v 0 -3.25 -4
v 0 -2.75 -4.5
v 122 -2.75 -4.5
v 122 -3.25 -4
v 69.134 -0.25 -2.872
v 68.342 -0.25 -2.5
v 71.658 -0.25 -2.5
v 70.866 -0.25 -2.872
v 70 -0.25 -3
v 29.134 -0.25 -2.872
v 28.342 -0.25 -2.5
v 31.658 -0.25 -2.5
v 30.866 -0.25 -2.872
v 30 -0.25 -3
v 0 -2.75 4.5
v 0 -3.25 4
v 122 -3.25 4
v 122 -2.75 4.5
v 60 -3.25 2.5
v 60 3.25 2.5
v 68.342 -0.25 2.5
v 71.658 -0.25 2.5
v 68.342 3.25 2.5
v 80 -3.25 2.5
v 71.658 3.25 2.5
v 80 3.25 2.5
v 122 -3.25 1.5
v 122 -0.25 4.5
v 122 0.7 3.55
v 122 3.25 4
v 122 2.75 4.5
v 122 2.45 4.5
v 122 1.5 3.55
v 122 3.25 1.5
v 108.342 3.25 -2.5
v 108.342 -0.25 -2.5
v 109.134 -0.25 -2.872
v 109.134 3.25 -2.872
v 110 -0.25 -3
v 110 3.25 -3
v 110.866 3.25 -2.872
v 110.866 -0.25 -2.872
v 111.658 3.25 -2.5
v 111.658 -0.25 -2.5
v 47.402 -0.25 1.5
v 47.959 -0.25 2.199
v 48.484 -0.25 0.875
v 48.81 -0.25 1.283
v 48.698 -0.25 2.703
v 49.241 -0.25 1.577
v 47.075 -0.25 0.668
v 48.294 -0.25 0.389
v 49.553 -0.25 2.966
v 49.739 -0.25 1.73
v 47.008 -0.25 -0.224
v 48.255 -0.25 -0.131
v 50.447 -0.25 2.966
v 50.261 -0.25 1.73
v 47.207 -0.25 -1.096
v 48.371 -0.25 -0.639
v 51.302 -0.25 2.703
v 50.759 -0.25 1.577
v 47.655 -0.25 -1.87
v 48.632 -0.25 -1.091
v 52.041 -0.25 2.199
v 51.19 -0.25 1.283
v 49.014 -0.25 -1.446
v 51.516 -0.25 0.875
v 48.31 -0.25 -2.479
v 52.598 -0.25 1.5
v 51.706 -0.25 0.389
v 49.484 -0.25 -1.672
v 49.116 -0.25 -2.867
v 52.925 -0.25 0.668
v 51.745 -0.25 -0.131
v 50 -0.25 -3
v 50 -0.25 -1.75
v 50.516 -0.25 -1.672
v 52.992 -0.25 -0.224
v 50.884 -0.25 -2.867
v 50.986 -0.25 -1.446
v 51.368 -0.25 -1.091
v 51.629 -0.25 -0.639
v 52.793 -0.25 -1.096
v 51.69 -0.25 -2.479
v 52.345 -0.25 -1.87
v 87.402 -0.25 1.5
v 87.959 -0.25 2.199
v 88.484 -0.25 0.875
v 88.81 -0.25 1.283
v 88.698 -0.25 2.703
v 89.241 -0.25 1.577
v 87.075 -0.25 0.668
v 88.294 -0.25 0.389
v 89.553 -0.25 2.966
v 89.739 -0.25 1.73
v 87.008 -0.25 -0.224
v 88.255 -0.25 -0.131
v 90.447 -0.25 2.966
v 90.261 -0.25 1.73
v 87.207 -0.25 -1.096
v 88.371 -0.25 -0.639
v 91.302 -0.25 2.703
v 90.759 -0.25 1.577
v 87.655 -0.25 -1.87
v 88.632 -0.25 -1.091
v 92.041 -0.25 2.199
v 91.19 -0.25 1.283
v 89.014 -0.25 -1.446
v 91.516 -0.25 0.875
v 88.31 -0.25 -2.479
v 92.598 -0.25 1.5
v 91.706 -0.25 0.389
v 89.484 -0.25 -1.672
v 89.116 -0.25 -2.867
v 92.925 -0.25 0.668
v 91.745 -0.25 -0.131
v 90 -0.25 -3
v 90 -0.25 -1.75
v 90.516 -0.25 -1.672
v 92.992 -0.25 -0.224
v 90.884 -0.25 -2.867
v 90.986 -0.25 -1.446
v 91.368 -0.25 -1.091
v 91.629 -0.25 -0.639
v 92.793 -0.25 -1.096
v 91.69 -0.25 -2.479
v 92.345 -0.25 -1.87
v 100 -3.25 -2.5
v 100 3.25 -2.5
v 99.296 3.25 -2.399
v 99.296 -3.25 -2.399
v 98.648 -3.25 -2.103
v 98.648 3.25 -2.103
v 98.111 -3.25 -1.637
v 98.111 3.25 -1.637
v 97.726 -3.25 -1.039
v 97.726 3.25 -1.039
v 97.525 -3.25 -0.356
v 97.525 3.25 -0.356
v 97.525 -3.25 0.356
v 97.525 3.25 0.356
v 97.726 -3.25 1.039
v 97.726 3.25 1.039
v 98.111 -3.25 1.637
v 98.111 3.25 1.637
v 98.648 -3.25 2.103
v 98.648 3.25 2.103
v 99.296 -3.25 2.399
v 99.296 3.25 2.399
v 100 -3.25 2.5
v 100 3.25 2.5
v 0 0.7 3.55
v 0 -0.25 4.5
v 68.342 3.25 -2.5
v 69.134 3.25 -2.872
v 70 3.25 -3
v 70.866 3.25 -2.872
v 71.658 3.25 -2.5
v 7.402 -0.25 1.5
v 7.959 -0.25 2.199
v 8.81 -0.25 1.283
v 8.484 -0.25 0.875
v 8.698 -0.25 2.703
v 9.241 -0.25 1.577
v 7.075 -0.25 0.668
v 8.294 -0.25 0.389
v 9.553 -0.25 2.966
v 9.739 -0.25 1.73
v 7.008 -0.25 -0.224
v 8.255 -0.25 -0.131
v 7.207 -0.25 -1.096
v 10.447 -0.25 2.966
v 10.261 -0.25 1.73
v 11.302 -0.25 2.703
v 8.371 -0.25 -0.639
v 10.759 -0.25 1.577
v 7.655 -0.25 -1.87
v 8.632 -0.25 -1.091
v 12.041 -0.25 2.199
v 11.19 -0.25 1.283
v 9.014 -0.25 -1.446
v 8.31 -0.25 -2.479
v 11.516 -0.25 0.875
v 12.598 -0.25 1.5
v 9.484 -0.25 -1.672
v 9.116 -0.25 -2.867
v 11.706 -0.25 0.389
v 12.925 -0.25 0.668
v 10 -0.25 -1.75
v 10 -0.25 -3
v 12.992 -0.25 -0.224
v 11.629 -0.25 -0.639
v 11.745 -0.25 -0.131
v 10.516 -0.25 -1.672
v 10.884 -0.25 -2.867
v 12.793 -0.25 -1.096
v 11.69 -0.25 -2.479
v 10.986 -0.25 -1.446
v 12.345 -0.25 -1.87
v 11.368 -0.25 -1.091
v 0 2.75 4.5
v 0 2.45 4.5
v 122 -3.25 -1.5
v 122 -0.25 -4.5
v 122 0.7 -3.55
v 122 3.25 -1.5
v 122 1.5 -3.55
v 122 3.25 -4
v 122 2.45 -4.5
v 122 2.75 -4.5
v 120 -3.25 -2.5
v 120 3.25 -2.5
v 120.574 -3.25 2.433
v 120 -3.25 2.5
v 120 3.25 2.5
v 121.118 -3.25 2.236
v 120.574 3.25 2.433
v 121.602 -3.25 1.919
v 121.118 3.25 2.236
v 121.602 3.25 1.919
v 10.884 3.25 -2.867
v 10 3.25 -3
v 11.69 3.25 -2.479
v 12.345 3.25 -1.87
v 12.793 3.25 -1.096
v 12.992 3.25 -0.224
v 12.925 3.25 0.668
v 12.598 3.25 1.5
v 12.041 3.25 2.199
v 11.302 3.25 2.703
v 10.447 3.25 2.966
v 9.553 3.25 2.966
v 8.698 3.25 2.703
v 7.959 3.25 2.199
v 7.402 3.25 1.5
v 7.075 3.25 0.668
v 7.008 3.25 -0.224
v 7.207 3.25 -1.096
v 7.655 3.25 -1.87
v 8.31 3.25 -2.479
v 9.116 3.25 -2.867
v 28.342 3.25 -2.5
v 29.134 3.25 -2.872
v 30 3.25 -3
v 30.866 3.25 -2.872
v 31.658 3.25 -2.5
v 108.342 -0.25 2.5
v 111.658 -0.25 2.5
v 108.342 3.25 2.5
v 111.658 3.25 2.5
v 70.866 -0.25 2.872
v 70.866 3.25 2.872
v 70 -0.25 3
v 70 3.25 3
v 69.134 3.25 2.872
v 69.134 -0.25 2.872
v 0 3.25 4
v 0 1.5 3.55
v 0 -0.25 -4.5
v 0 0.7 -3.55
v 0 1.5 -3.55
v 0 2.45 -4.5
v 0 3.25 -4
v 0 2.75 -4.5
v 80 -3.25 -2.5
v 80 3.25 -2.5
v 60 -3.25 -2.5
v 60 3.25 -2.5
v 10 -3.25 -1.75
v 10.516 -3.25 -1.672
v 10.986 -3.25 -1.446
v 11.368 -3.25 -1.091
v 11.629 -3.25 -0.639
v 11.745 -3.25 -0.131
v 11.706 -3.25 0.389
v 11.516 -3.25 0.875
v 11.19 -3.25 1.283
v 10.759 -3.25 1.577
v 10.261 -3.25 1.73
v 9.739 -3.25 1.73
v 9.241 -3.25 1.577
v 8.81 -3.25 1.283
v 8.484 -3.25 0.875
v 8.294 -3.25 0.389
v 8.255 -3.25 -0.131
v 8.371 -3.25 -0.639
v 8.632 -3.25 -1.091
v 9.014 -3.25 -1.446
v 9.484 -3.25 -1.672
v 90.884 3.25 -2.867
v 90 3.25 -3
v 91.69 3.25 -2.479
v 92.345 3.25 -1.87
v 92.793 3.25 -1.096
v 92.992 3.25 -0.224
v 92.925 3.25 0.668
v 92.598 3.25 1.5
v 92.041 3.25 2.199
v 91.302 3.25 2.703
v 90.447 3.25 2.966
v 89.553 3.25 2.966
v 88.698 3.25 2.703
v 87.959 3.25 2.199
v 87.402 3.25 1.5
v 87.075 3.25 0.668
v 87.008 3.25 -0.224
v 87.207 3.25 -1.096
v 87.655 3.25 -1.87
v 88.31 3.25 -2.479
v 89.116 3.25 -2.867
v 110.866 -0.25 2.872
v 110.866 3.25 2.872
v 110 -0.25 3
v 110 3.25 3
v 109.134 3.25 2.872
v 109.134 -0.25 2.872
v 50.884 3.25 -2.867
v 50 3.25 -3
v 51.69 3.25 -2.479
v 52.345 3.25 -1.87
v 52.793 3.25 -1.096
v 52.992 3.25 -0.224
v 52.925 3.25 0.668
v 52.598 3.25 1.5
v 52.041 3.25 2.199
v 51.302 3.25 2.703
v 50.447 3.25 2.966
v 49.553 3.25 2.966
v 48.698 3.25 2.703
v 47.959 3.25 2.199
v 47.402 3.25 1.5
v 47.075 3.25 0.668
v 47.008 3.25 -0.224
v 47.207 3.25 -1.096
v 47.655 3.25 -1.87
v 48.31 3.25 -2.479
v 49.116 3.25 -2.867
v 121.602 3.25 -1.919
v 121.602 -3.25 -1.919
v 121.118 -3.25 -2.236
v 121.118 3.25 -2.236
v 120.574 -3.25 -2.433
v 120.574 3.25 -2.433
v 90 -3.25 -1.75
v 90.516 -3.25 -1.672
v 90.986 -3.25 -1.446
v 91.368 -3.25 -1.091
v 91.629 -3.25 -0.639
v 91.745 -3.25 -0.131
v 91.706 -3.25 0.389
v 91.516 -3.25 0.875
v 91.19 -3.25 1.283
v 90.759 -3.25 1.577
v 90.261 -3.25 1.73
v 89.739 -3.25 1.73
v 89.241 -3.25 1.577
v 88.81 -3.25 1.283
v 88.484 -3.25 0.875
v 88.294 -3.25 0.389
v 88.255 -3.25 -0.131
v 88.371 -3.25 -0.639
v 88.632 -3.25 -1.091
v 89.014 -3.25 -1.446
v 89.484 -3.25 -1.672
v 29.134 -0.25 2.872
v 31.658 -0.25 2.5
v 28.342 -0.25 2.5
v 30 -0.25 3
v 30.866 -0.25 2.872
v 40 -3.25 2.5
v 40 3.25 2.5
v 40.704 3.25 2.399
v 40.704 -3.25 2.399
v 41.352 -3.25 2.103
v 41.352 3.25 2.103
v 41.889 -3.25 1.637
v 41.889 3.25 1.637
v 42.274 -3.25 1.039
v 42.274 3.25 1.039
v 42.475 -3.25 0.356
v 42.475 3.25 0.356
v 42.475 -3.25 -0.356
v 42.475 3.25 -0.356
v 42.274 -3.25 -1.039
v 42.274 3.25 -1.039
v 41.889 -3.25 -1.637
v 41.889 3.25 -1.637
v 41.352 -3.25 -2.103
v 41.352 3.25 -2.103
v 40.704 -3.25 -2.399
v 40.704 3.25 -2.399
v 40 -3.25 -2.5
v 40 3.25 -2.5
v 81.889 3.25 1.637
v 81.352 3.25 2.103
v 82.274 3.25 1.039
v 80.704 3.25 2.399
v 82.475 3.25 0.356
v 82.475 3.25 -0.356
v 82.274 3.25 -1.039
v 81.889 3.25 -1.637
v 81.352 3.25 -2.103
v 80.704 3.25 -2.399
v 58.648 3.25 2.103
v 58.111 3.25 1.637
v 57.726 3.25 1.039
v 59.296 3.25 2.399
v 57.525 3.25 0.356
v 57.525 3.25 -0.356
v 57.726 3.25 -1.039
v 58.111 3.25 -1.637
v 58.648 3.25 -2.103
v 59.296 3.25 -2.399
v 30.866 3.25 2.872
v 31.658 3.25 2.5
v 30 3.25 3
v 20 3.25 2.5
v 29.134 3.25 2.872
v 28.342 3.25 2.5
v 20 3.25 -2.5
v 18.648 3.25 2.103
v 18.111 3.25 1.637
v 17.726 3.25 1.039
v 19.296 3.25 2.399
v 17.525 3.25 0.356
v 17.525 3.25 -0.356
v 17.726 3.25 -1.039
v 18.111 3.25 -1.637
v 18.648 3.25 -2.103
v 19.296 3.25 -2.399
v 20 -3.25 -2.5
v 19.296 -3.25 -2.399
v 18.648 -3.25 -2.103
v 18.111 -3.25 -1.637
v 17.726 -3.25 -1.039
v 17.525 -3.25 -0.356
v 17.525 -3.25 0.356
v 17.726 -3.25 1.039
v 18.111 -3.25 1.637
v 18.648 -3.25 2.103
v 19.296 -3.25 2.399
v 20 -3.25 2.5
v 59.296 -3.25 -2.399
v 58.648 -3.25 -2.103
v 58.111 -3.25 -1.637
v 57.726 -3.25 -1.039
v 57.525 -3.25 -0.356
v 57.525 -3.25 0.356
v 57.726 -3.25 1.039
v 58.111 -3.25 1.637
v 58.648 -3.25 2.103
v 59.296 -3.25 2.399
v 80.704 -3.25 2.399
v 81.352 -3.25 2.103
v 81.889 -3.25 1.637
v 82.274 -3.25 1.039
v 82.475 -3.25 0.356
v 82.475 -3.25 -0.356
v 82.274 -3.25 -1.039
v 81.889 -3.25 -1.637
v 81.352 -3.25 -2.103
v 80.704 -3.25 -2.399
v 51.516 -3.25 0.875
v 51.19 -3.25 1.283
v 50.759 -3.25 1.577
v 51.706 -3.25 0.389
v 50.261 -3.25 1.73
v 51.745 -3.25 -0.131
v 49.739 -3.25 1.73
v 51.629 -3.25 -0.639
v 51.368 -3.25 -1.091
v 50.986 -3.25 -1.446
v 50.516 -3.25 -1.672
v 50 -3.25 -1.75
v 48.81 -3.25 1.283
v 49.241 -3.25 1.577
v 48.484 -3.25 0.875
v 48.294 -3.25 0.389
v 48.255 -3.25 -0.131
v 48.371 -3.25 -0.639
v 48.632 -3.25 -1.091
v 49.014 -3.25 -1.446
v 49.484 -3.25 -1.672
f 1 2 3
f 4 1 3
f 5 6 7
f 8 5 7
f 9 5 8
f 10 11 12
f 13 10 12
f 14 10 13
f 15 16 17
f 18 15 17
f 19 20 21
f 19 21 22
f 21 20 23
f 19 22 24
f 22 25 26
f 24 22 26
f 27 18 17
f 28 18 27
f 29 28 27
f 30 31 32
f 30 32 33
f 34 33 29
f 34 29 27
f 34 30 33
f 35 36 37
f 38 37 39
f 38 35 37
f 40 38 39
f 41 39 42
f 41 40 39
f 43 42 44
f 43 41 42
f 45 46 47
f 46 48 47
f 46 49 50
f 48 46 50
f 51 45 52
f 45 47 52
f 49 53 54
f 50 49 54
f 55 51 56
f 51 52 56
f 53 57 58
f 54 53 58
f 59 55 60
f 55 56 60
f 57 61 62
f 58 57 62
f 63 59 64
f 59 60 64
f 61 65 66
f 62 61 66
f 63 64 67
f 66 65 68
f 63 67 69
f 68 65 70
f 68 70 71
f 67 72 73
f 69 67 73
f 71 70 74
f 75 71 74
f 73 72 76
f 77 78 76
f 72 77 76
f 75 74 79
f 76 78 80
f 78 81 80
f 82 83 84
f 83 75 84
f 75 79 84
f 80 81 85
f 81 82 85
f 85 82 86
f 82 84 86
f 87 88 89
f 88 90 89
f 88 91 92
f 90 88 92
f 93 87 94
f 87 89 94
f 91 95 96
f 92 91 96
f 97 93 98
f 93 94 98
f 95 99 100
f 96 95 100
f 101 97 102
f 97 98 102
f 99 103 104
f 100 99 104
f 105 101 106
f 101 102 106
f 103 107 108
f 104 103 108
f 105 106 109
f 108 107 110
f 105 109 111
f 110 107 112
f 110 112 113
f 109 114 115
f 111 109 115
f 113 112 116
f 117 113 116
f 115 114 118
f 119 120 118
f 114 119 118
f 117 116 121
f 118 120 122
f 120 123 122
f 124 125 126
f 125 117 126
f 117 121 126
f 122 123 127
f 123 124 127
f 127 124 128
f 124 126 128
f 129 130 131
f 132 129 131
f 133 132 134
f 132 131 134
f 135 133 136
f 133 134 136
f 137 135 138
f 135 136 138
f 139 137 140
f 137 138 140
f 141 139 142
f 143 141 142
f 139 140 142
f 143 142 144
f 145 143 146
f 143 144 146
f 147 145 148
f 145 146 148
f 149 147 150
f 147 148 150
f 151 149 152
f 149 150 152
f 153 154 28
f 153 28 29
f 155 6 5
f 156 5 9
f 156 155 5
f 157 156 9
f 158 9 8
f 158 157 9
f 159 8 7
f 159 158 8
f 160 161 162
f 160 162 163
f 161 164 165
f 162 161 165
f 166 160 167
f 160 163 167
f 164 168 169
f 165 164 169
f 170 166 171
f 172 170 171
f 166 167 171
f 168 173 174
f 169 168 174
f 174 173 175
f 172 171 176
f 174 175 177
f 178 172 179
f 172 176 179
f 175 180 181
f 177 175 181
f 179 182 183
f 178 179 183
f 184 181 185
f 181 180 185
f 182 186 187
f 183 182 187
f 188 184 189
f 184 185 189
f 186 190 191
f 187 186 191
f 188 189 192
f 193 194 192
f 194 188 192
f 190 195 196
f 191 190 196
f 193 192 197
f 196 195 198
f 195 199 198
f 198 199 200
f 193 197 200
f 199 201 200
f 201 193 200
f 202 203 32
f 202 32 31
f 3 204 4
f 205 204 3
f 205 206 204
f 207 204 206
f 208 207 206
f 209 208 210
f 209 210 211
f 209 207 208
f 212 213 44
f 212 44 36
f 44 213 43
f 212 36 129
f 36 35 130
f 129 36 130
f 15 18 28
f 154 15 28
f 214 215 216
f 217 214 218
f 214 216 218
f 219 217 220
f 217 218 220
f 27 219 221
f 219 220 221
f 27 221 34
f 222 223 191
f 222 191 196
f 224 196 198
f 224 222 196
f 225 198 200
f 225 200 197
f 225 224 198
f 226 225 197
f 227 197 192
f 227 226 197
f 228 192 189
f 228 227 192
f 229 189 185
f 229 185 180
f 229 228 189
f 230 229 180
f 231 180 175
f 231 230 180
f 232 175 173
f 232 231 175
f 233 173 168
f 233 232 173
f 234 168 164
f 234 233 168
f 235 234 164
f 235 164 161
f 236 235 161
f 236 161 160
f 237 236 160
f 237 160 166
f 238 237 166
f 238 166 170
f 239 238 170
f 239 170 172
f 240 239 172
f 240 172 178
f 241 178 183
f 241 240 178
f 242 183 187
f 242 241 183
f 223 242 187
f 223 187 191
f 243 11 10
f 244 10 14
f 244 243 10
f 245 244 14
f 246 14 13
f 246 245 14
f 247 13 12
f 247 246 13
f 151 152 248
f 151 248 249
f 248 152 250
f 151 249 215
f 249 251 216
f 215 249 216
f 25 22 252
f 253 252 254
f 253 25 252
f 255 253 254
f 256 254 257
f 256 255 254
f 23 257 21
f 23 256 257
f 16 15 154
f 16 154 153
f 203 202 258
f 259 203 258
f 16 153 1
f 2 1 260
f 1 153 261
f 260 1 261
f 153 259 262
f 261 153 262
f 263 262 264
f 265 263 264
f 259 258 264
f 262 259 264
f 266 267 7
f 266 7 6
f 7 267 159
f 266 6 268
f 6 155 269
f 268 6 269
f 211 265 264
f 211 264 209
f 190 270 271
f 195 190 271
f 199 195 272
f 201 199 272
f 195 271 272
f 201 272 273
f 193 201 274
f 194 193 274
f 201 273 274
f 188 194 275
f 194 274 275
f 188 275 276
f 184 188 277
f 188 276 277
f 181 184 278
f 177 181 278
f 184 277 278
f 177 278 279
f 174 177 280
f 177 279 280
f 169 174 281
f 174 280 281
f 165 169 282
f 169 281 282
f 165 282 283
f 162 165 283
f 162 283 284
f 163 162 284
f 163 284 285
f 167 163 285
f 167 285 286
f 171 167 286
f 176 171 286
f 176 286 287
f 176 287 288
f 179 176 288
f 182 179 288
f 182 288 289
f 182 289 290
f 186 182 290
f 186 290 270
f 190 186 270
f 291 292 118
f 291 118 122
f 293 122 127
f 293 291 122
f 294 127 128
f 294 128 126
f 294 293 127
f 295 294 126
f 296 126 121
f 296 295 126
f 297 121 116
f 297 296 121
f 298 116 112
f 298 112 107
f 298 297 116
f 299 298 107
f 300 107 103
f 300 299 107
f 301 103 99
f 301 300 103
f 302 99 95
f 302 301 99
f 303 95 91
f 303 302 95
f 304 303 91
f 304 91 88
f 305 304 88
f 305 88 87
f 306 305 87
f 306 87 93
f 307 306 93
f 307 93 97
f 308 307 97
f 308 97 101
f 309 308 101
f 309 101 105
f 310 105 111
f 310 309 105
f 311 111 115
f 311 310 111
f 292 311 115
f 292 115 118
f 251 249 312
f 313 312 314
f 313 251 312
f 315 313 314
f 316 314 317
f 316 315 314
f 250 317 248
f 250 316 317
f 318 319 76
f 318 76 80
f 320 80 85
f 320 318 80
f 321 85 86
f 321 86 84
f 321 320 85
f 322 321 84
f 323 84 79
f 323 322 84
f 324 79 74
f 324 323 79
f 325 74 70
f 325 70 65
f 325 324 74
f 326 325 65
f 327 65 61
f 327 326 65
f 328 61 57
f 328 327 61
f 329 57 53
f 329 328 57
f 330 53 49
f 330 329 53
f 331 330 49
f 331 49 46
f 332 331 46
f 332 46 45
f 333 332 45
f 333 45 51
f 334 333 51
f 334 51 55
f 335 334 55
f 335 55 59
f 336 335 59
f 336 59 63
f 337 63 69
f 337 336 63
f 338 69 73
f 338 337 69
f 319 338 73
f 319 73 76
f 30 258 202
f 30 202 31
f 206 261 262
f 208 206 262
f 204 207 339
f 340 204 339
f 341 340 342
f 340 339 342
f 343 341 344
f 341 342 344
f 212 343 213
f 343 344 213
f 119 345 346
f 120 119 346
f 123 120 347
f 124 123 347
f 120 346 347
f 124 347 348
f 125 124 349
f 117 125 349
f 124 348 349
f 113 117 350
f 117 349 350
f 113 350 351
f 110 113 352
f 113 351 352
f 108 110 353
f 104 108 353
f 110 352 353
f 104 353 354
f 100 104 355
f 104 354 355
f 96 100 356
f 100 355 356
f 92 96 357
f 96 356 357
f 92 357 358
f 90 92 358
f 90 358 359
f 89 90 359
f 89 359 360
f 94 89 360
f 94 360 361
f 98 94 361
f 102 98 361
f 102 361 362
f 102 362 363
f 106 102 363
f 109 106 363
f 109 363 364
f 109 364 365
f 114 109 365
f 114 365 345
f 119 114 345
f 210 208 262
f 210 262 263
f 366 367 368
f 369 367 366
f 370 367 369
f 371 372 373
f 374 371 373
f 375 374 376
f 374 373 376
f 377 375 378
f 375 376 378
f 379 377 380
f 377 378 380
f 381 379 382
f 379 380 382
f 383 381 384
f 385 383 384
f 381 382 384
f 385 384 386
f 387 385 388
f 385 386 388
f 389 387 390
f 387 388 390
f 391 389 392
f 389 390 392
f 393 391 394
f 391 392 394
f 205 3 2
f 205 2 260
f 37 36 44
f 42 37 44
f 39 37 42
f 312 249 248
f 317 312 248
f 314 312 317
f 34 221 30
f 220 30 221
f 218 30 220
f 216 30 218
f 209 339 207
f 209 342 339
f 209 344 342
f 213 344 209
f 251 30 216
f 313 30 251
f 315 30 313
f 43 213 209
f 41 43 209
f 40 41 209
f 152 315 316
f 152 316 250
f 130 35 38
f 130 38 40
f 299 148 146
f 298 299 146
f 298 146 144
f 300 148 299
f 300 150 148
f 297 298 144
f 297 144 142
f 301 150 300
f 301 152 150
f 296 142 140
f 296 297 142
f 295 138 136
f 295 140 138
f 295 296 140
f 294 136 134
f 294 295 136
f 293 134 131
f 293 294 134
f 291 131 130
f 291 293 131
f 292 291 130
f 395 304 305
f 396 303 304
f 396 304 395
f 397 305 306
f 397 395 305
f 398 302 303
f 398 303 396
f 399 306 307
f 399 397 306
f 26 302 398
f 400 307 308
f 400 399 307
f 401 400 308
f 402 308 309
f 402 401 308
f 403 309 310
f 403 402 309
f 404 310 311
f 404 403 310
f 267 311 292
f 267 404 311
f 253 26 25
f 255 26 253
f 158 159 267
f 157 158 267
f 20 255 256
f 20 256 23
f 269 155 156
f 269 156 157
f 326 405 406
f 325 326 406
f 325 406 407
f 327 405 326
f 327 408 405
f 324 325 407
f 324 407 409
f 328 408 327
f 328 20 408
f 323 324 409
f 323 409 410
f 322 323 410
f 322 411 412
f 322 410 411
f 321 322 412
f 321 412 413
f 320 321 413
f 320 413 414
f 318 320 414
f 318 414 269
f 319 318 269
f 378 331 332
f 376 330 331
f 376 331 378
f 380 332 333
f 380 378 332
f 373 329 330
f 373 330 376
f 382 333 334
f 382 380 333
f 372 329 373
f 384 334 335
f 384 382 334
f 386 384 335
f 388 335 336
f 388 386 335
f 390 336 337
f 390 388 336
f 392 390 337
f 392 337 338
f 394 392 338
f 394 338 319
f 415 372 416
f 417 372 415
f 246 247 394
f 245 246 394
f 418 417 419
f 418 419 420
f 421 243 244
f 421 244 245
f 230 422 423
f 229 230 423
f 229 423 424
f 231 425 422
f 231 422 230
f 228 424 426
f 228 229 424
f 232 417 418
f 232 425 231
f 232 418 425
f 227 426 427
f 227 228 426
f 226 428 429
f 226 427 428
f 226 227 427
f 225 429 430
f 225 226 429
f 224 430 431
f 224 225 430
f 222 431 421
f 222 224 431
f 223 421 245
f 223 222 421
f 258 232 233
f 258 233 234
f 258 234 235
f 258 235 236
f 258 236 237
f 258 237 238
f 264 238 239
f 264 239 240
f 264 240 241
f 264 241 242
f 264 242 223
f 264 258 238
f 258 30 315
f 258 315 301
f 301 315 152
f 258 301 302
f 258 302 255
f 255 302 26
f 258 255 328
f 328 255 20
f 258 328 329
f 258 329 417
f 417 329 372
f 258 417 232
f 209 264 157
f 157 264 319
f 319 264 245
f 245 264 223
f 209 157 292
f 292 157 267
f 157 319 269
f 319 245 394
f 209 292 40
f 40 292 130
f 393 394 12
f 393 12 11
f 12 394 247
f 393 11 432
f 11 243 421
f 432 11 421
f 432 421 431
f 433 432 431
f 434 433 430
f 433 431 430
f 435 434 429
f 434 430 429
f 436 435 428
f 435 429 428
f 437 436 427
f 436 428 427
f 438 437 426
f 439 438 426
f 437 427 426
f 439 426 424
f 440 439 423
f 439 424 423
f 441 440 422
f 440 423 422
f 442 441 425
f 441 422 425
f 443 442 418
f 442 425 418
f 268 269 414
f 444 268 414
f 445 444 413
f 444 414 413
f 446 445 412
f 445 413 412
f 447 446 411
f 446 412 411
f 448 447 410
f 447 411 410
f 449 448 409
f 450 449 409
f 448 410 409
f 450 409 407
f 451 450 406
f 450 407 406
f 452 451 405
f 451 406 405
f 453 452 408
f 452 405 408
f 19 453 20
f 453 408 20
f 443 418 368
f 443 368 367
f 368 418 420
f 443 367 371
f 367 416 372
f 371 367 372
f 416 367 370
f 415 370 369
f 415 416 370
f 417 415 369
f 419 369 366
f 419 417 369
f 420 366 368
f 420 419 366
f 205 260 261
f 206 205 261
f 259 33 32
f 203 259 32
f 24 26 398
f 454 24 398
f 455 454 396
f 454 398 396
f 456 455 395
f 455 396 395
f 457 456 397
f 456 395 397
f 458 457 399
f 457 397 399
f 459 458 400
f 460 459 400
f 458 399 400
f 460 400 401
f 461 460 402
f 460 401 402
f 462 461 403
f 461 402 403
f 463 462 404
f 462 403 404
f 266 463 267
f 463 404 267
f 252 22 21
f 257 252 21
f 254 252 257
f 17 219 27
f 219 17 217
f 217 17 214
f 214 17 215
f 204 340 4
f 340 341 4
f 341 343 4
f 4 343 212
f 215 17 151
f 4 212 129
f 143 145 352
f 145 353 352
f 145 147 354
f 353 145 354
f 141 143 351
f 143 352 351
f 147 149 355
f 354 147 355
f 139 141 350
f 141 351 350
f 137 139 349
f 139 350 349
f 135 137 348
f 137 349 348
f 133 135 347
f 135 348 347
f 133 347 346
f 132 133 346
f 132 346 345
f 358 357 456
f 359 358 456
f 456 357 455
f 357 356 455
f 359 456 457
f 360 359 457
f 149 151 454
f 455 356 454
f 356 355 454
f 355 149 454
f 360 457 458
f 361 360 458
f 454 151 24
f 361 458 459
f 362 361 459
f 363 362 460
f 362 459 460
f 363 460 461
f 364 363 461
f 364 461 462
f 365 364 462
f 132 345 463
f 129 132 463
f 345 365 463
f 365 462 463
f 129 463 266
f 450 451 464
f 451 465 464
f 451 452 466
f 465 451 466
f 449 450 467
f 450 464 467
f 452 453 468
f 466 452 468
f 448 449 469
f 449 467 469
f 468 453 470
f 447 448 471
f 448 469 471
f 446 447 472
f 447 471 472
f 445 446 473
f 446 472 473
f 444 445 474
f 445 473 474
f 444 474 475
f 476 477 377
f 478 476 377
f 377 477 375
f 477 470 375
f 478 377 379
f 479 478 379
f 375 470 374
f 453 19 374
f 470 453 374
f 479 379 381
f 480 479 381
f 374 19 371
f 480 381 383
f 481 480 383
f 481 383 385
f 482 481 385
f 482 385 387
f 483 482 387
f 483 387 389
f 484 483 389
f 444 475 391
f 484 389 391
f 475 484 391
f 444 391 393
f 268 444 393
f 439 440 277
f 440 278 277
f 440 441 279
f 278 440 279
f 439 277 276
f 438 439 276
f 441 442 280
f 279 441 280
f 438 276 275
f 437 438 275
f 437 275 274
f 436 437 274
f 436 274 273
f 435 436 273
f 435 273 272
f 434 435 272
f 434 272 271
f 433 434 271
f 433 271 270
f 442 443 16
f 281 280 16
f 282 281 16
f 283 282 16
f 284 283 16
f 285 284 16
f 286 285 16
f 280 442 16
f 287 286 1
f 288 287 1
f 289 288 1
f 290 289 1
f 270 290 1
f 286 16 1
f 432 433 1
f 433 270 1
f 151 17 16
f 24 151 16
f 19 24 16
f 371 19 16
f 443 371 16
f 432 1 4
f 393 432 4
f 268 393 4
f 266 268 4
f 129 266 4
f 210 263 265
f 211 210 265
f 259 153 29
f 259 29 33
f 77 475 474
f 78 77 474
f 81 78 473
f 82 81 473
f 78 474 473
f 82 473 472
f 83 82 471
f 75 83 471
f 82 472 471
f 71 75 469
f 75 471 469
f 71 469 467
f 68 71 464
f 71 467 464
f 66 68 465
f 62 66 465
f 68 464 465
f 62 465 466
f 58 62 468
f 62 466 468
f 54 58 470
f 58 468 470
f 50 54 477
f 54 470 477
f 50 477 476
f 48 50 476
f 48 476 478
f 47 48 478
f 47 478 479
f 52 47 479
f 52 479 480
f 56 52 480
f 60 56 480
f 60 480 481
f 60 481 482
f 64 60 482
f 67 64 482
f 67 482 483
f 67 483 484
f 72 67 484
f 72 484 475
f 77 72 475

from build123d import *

# Parameters (mm, degrees)
SKETCH_1_W            = 9
SKETCH_1_H            = 6.5
EXTRUDE_1_DEPTH       = 122
SKETCH_2_R            = 1.75
CUT_EXTRUDE_2_DEPTH   = 8
SKETCH_3_R            = 3
CUT_EXTRUDE_3_DEPTH   = 3.5
CHAMFER_1_SIZE        = 0.5
CUT_EXTRUDE_2_2_DEPTH = 123.126215449
CUT_EXTRUDE_3_2_DEPTH = 10


with BuildPart() as part:
    # 草图1 → 拉伸1 (new body)
    with BuildSketch(Plane(origin=(0, 0, 0), x_dir=(0, 0, -1), z_dir=(1, 0, 0))):
        Rectangle(SKETCH_1_W, SKETCH_1_H)
    extrude(amount=EXTRUDE_1_DEPTH)

    # 草图2 → Cut-Extrude 2 (cut)
    with BuildSketch(Plane.XZ.offset(3.25)):
        with Locations(Location((10, 0, 0), (0, 0, 270))):
            Circle(SKETCH_2_R)
        with Locations(Location((30, 0, 0), (0, 0, 270))):
            Circle(SKETCH_2_R)
        with Locations(Location((50, 0, 0), (0, 0, 270))):
            Circle(SKETCH_2_R)
        with Locations(Location((70, 0, 0), (0, 0, 270))):
            Circle(SKETCH_2_R)
        with Locations(Location((90, 0, 0), (0, 0, 270))):
            Circle(SKETCH_2_R)
        with Locations(Location((110, 0, 0), (0, 0, 270))):
            Circle(SKETCH_2_R)
        with Locations((130, 0)):
            Circle(SKETCH_2_R)
        with Locations((150, 0)):
            Circle(SKETCH_2_R)
        with Locations((170, 0)):
            Circle(SKETCH_2_R)
        with Locations((190, 0)):
            Circle(SKETCH_2_R)
        with Locations((210, 0)):
            Circle(SKETCH_2_R)
        with Locations((230, 0)):
            Circle(SKETCH_2_R)
        with Locations((250, 0)):
            Circle(SKETCH_2_R)
        with Locations((270, 0)):
            Circle(SKETCH_2_R)
        with Locations((290, 0)):
            Circle(SKETCH_2_R)
        with Locations((310, 0)):
            Circle(SKETCH_2_R)
        with Locations((330, 0)):
            Circle(SKETCH_2_R)
        with Locations((350, 0)):
            Circle(SKETCH_2_R)
        with Locations((370, 0)):
            Circle(SKETCH_2_R)
        with Locations((390, 0)):
            Circle(SKETCH_2_R)
        with Locations((410, 0)):
            Circle(SKETCH_2_R)
        with Locations((430, 0)):
            Circle(SKETCH_2_R)
        with Locations((450, 0)):
            Circle(SKETCH_2_R)
        with Locations((470, 0)):
            Circle(SKETCH_2_R)
        with Locations((490, 0)):
            Circle(SKETCH_2_R)
        with Locations((510, 0)):
            Circle(SKETCH_2_R)
        with Locations((530, 0)):
            Circle(SKETCH_2_R)
        with Locations((550, 0)):
            Circle(SKETCH_2_R)
        with Locations((570, 0)):
            Circle(SKETCH_2_R)
        with Locations((590, 0)):
            Circle(SKETCH_2_R)
        with Locations((610, 0)):
            Circle(SKETCH_2_R)
        with Locations((630, 0)):
            Circle(SKETCH_2_R)
        with Locations((650, 0)):
            Circle(SKETCH_2_R)
        with Locations((670, 0)):
            Circle(SKETCH_2_R)
        with Locations((690, 0)):
            Circle(SKETCH_2_R)
        with Locations((710, 0)):
            Circle(SKETCH_2_R)
        with Locations((730, 0)):
            Circle(SKETCH_2_R)
        with Locations((750, 0)):
            Circle(SKETCH_2_R)
        with Locations((770, 0)):
            Circle(SKETCH_2_R)
        with Locations((790, 0)):
            Circle(SKETCH_2_R)
        with Locations((810, 0)):
            Circle(SKETCH_2_R)
        with Locations((830, 0)):
            Circle(SKETCH_2_R)
        with Locations((850, 0)):
            Circle(SKETCH_2_R)
        with Locations((870, 0)):
            Circle(SKETCH_2_R)
        with Locations((890, 0)):
            Circle(SKETCH_2_R)
        with Locations((910, 0)):
            Circle(SKETCH_2_R)
        with Locations((930, 0)):
            Circle(SKETCH_2_R)
        with Locations((950, 0)):
            Circle(SKETCH_2_R)
        with Locations((970, 0)):
            Circle(SKETCH_2_R)
        with Locations((990, 0)):
            Circle(SKETCH_2_R)
        with Locations((1010, 0)):
            Circle(SKETCH_2_R)
        with Locations((1030, 0)):
            Circle(SKETCH_2_R)
        with Locations((1050, 0)):
            Circle(SKETCH_2_R)
        with Locations((1070, 0)):
            Circle(SKETCH_2_R)
        with Locations((1090, 0)):
            Circle(SKETCH_2_R)
        with Locations((1110, 0)):
            Circle(SKETCH_2_R)
        with Locations((1130, 0)):
            Circle(SKETCH_2_R)
        with Locations((1150, 0)):
            Circle(SKETCH_2_R)
        with Locations((1170, 0)):
            Circle(SKETCH_2_R)
        with Locations((1190, 0)):
            Circle(SKETCH_2_R)
    extrude(amount=-CUT_EXTRUDE_2_DEPTH, mode=Mode.SUBTRACT)

    # 草图3 → Cut-Extrude 3 (cut)
    with BuildSketch(Plane.XZ.offset(-3.25)):
        with Locations(Location((10, 0, 0), (0, 0, 270))):
            Circle(SKETCH_3_R)
        with Locations(Location((30, 0, 0), (0, 0, 270))):
            Circle(SKETCH_3_R)
        with Locations(Location((50, 0, 0), (0, 0, 270))):
            Circle(SKETCH_3_R)
        with Locations(Location((70, 0, 0), (0, 0, 270))):
            Circle(SKETCH_3_R)
        with Locations(Location((90, 0, 0), (0, 0, 270))):
            Circle(SKETCH_3_R)
        with Locations(Location((110, 0, 0), (0, 0, 270))):
            Circle(SKETCH_3_R)
        with Locations((130, 0)):
            Circle(SKETCH_3_R)
        with Locations((150, 0)):
            Circle(SKETCH_3_R)
        with Locations((170, 0)):
            Circle(SKETCH_3_R)
        with Locations((190, 0)):
            Circle(SKETCH_3_R)
        with Locations((210, 0)):
            Circle(SKETCH_3_R)
        with Locations((230, 0)):
            Circle(SKETCH_3_R)
        with Locations((250, 0)):
            Circle(SKETCH_3_R)
        with Locations((270, 0)):
            Circle(SKETCH_3_R)
        with Locations((290, 0)):
            Circle(SKETCH_3_R)
        with Locations((310, 0)):
            Circle(SKETCH_3_R)
        with Locations((330, 0)):
            Circle(SKETCH_3_R)
        with Locations((350, 0)):
            Circle(SKETCH_3_R)
        with Locations((370, 0)):
            Circle(SKETCH_3_R)
        with Locations((390, 0)):
            Circle(SKETCH_3_R)
        with Locations((410, 0)):
            Circle(SKETCH_3_R)
        with Locations((430, 0)):
            Circle(SKETCH_3_R)
        with Locations((450, 0)):
            Circle(SKETCH_3_R)
        with Locations((470, 0)):
            Circle(SKETCH_3_R)
        with Locations((490, 0)):
            Circle(SKETCH_3_R)
        with Locations((510, 0)):
            Circle(SKETCH_3_R)
        with Locations((530, 0)):
            Circle(SKETCH_3_R)
        with Locations((550, 0)):
            Circle(SKETCH_3_R)
        with Locations((570, 0)):
            Circle(SKETCH_3_R)
        with Locations((590, 0)):
            Circle(SKETCH_3_R)
        with Locations((610, 0)):
            Circle(SKETCH_3_R)
        with Locations((630, 0)):
            Circle(SKETCH_3_R)
        with Locations((650, 0)):
            Circle(SKETCH_3_R)
        with Locations((670, 0)):
            Circle(SKETCH_3_R)
        with Locations((690, 0)):
            Circle(SKETCH_3_R)
        with Locations((710, 0)):
            Circle(SKETCH_3_R)
        with Locations((730, 0)):
            Circle(SKETCH_3_R)
        with Locations((750, 0)):
            Circle(SKETCH_3_R)
        with Locations((770, 0)):
            Circle(SKETCH_3_R)
        with Locations((790, 0)):
            Circle(SKETCH_3_R)
        with Locations((810, 0)):
            Circle(SKETCH_3_R)
        with Locations((830, 0)):
            Circle(SKETCH_3_R)
        with Locations((850, 0)):
            Circle(SKETCH_3_R)
        with Locations((870, 0)):
            Circle(SKETCH_3_R)
        with Locations((890, 0)):
            Circle(SKETCH_3_R)
        with Locations((910, 0)):
            Circle(SKETCH_3_R)
        with Locations((930, 0)):
            Circle(SKETCH_3_R)
        with Locations((950, 0)):
            Circle(SKETCH_3_R)
        with Locations((970, 0)):
            Circle(SKETCH_3_R)
        with Locations((990, 0)):
            Circle(SKETCH_3_R)
        with Locations((1010, 0)):
            Circle(SKETCH_3_R)
        with Locations((1030, 0)):
            Circle(SKETCH_3_R)
        with Locations((1050, 0)):
            Circle(SKETCH_3_R)
        with Locations((1070, 0)):
            Circle(SKETCH_3_R)
        with Locations((1090, 0)):
            Circle(SKETCH_3_R)
        with Locations((1110, 0)):
            Circle(SKETCH_3_R)
        with Locations((1130, 0)):
            Circle(SKETCH_3_R)
        with Locations((1150, 0)):
            Circle(SKETCH_3_R)
        with Locations((1170, 0)):
            Circle(SKETCH_3_R)
        with Locations((1190, 0)):
            Circle(SKETCH_3_R)
    extrude(amount=CUT_EXTRUDE_3_DEPTH, mode=Mode.SUBTRACT)

    # 倒角1
    chamfer_1_edges = [part.edges().sort_by_distance(p)[0] for p in [
        (61, 3.25, 4.5),
        (61, 3.25, -4.5),
        (61, -3.25, -4.5),
        (61, -3.25, 4.5),
    ]]
    chamfer(chamfer_1_edges, length=CHAMFER_1_SIZE)

    # 草图4 → Cut-Extrude 2 2 (cut, through all)
    with BuildSketch(Plane.ZY):
        Polygon((-4.5, 2.45), (-4.5, -0.25), (-3.55, 0.7), (-3.55, 1.5), align=None)
        Polygon((4.5, 2.45), (4.5, -0.25), (3.55, 0.7), (3.55, 1.5), align=None)
    extrude(amount=-CUT_EXTRUDE_2_2_DEPTH, mode=Mode.SUBTRACT)

    # 草图5 → Cut-Extrude 3 2 (cut)
    with BuildSketch(Plane(origin=(0, 3.25, 0), x_dir=(1, 0, 0), z_dir=(0, 1, 0))):
        with BuildLine():
            Line((60, -2.5), (80, -2.5))
            ThreePointArc((80, -2.5), (82.5, 0), (80, 2.5))
            Line((80, 2.5), (60, 2.5))
            ThreePointArc((60, 2.5), (57.5, 0), (60, -2.5))
        make_face()
        with BuildLine():
            Line((20, -2.5), (40, -2.5))
            ThreePointArc((40, -2.5), (42.5, 0), (40, 2.5))
            Line((40, 2.5), (20, 2.5))
            ThreePointArc((20, 2.5), (17.5, 0), (20, -2.5))
        make_face()
        with BuildLine():
            Line((100, -2.5), (120, -2.5))
            ThreePointArc((120, -2.5), (122.5, 0), (120, 2.5))
            Line((120, 2.5), (100, 2.5))
            ThreePointArc((100, 2.5), (97.5, 0), (100, -2.5))
        make_face()
        with BuildLine():
            Line((140, -2.5), (160, -2.5))
            ThreePointArc((160, -2.5), (162.5, 0), (160, 2.5))
            Line((160, 2.5), (140, 2.5))
            ThreePointArc((140, 2.5), (137.5, 0), (140, -2.5))
        make_face()
        with BuildLine():
            Line((180, -2.5), (200, -2.5))
            ThreePointArc((200, -2.5), (202.5, 0), (200, 2.5))
            Line((200, 2.5), (180, 2.5))
            ThreePointArc((180, 2.5), (177.5, 0), (180, -2.5))
        make_face()
        with BuildLine():
            Line((220, -2.5), (240, -2.5))
            ThreePointArc((240, -2.5), (242.5, 0), (240, 2.5))
            Line((240, 2.5), (220, 2.5))
            ThreePointArc((220, 2.5), (217.5, 0), (220, -2.5))
        make_face()
        with BuildLine():
            Line((260, -2.5), (280, -2.5))
            ThreePointArc((280, -2.5), (282.5, 0), (280, 2.5))
            Line((280, 2.5), (260, 2.5))
            ThreePointArc((260, 2.5), (257.5, 0), (260, -2.5))
        make_face()
        with BuildLine():
            Line((300, -2.5), (320, -2.5))
            ThreePointArc((320, -2.5), (322.5, 0), (320, 2.5))
            Line((320, 2.5), (300, 2.5))
            ThreePointArc((300, 2.5), (297.5, 0), (300, -2.5))
        make_face()
        with BuildLine():
            Line((340, -2.5), (360, -2.5))
            ThreePointArc((360, -2.5), (362.5, 0), (360, 2.5))
            Line((360, 2.5), (340, 2.5))
            ThreePointArc((340, 2.5), (337.5, 0), (340, -2.5))
        make_face()
        with BuildLine():
            Line((380, -2.5), (400, -2.5))
            ThreePointArc((400, -2.5), (402.5, 0), (400, 2.5))
            Line((400, 2.5), (380, 2.5))
            ThreePointArc((380, 2.5), (377.5, 0), (380, -2.5))
        make_face()
        with BuildLine():
            Line((420, -2.5), (440, -2.5))
            ThreePointArc((440, -2.5), (442.5, 0), (440, 2.5))
            Line((440, 2.5), (420, 2.5))
            ThreePointArc((420, 2.5), (417.5, 0), (420, -2.5))
        make_face()
        with BuildLine():
            Line((460, -2.5), (480, -2.5))
            ThreePointArc((480, -2.5), (482.5, 0), (480, 2.5))
            Line((480, 2.5), (460, 2.5))
            ThreePointArc((460, 2.5), (457.5, 0), (460, -2.5))
        make_face()
        with BuildLine():
            Line((500, -2.5), (520, -2.5))
            ThreePointArc((520, -2.5), (522.5, 0), (520, 2.5))
            Line((520, 2.5), (500, 2.5))
            ThreePointArc((500, 2.5), (497.5, 0), (500, -2.5))
        make_face()
        with BuildLine():
            Line((540, -2.5), (560, -2.5))
            ThreePointArc((560, -2.5), (562.5, 0), (560, 2.5))
            Line((560, 2.5), (540, 2.5))
            ThreePointArc((540, 2.5), (537.5, 0), (540, -2.5))
        make_face()
        with BuildLine():
            Line((580, -2.5), (600, -2.5))
            ThreePointArc((600, -2.5), (602.5, 0), (600, 2.5))
            Line((600, 2.5), (580, 2.5))
            ThreePointArc((580, 2.5), (577.5, 0), (580, -2.5))
        make_face()
        with BuildLine():
            Line((620, -2.5), (640, -2.5))
            ThreePointArc((640, -2.5), (642.5, 0), (640, 2.5))
            Line((640, 2.5), (620, 2.5))
            ThreePointArc((620, 2.5), (617.5, 0), (620, -2.5))
        make_face()
        with BuildLine():
            Line((660, -2.5), (680, -2.5))
            ThreePointArc((680, -2.5), (682.5, 0), (680, 2.5))
            Line((680, 2.5), (660, 2.5))
            ThreePointArc((660, 2.5), (657.5, 0), (660, -2.5))
        make_face()
        with BuildLine():
            Line((700, -2.5), (720, -2.5))
            ThreePointArc((720, -2.5), (722.5, 0), (720, 2.5))
            Line((720, 2.5), (700, 2.5))
            ThreePointArc((700, 2.5), (697.5, 0), (700, -2.5))
        make_face()
        with BuildLine():
            Line((740, -2.5), (760, -2.5))
            ThreePointArc((760, -2.5), (762.5, 0), (760, 2.5))
            Line((760, 2.5), (740, 2.5))
            ThreePointArc((740, 2.5), (737.5, 0), (740, -2.5))
        make_face()
        with BuildLine():
            Line((780, -2.5), (800, -2.5))
            ThreePointArc((800, -2.5), (802.5, 0), (800, 2.5))
            Line((800, 2.5), (780, 2.5))
            ThreePointArc((780, 2.5), (777.5, 0), (780, -2.5))
        make_face()
        with BuildLine():
            Line((820, -2.5), (840, -2.5))
            ThreePointArc((840, -2.5), (842.5, 0), (840, 2.5))
            Line((840, 2.5), (820, 2.5))
            ThreePointArc((820, 2.5), (817.5, 0), (820, -2.5))
        make_face()
        with BuildLine():
            Line((860, -2.5), (880, -2.5))
            ThreePointArc((880, -2.5), (882.5, 0), (880, 2.5))
            Line((880, 2.5), (860, 2.5))
            ThreePointArc((860, 2.5), (857.5, 0), (860, -2.5))
        make_face()
        with BuildLine():
            Line((900, -2.5), (920, -2.5))
            ThreePointArc((920, -2.5), (922.5, 0), (920, 2.5))
            Line((920, 2.5), (900, 2.5))
            ThreePointArc((900, 2.5), (897.5, 0), (900, -2.5))
        make_face()
        with BuildLine():
            Line((940, -2.5), (960, -2.5))
            ThreePointArc((960, -2.5), (962.5, 0), (960, 2.5))
            Line((960, 2.5), (940, 2.5))
            ThreePointArc((940, 2.5), (937.5, 0), (940, -2.5))
        make_face()
        with BuildLine():
            Line((980, -2.5), (1000, -2.5))
            ThreePointArc((1000, -2.5), (1002.5, 0), (1000, 2.5))
            Line((1000, 2.5), (980, 2.5))
            ThreePointArc((980, 2.5), (977.5, 0), (980, -2.5))
        make_face()
        with BuildLine():
            Line((1020, -2.5), (1040, -2.5))
            ThreePointArc((1040, -2.5), (1042.5, 0), (1040, 2.5))
            Line((1040, 2.5), (1020, 2.5))
            ThreePointArc((1020, 2.5), (1017.5, 0), (1020, -2.5))
        make_face()
        with BuildLine():
            Line((1060, -2.5), (1080, -2.5))
            ThreePointArc((1080, -2.5), (1082.5, 0), (1080, 2.5))
            Line((1080, 2.5), (1060, 2.5))
            ThreePointArc((1060, 2.5), (1057.5, 0), (1060, -2.5))
        make_face()
        with BuildLine():
            Line((1100, -2.5), (1120, -2.5))
            ThreePointArc((1120, -2.5), (1122.5, 0), (1120, 2.5))
            Line((1120, 2.5), (1100, 2.5))
            ThreePointArc((1100, 2.5), (1097.5, 0), (1100, -2.5))
        make_face()
        with BuildLine():
            Line((1140, -2.5), (1160, -2.5))
            ThreePointArc((1160, -2.5), (1162.5, 0), (1160, 2.5))
            Line((1160, 2.5), (1140, 2.5))
            ThreePointArc((1140, 2.5), (1137.5, 0), (1140, -2.5))
        make_face()
    extrude(amount=-CUT_EXTRUDE_3_2_DEPTH, mode=Mode.SUBTRACT)


solid = part.part
